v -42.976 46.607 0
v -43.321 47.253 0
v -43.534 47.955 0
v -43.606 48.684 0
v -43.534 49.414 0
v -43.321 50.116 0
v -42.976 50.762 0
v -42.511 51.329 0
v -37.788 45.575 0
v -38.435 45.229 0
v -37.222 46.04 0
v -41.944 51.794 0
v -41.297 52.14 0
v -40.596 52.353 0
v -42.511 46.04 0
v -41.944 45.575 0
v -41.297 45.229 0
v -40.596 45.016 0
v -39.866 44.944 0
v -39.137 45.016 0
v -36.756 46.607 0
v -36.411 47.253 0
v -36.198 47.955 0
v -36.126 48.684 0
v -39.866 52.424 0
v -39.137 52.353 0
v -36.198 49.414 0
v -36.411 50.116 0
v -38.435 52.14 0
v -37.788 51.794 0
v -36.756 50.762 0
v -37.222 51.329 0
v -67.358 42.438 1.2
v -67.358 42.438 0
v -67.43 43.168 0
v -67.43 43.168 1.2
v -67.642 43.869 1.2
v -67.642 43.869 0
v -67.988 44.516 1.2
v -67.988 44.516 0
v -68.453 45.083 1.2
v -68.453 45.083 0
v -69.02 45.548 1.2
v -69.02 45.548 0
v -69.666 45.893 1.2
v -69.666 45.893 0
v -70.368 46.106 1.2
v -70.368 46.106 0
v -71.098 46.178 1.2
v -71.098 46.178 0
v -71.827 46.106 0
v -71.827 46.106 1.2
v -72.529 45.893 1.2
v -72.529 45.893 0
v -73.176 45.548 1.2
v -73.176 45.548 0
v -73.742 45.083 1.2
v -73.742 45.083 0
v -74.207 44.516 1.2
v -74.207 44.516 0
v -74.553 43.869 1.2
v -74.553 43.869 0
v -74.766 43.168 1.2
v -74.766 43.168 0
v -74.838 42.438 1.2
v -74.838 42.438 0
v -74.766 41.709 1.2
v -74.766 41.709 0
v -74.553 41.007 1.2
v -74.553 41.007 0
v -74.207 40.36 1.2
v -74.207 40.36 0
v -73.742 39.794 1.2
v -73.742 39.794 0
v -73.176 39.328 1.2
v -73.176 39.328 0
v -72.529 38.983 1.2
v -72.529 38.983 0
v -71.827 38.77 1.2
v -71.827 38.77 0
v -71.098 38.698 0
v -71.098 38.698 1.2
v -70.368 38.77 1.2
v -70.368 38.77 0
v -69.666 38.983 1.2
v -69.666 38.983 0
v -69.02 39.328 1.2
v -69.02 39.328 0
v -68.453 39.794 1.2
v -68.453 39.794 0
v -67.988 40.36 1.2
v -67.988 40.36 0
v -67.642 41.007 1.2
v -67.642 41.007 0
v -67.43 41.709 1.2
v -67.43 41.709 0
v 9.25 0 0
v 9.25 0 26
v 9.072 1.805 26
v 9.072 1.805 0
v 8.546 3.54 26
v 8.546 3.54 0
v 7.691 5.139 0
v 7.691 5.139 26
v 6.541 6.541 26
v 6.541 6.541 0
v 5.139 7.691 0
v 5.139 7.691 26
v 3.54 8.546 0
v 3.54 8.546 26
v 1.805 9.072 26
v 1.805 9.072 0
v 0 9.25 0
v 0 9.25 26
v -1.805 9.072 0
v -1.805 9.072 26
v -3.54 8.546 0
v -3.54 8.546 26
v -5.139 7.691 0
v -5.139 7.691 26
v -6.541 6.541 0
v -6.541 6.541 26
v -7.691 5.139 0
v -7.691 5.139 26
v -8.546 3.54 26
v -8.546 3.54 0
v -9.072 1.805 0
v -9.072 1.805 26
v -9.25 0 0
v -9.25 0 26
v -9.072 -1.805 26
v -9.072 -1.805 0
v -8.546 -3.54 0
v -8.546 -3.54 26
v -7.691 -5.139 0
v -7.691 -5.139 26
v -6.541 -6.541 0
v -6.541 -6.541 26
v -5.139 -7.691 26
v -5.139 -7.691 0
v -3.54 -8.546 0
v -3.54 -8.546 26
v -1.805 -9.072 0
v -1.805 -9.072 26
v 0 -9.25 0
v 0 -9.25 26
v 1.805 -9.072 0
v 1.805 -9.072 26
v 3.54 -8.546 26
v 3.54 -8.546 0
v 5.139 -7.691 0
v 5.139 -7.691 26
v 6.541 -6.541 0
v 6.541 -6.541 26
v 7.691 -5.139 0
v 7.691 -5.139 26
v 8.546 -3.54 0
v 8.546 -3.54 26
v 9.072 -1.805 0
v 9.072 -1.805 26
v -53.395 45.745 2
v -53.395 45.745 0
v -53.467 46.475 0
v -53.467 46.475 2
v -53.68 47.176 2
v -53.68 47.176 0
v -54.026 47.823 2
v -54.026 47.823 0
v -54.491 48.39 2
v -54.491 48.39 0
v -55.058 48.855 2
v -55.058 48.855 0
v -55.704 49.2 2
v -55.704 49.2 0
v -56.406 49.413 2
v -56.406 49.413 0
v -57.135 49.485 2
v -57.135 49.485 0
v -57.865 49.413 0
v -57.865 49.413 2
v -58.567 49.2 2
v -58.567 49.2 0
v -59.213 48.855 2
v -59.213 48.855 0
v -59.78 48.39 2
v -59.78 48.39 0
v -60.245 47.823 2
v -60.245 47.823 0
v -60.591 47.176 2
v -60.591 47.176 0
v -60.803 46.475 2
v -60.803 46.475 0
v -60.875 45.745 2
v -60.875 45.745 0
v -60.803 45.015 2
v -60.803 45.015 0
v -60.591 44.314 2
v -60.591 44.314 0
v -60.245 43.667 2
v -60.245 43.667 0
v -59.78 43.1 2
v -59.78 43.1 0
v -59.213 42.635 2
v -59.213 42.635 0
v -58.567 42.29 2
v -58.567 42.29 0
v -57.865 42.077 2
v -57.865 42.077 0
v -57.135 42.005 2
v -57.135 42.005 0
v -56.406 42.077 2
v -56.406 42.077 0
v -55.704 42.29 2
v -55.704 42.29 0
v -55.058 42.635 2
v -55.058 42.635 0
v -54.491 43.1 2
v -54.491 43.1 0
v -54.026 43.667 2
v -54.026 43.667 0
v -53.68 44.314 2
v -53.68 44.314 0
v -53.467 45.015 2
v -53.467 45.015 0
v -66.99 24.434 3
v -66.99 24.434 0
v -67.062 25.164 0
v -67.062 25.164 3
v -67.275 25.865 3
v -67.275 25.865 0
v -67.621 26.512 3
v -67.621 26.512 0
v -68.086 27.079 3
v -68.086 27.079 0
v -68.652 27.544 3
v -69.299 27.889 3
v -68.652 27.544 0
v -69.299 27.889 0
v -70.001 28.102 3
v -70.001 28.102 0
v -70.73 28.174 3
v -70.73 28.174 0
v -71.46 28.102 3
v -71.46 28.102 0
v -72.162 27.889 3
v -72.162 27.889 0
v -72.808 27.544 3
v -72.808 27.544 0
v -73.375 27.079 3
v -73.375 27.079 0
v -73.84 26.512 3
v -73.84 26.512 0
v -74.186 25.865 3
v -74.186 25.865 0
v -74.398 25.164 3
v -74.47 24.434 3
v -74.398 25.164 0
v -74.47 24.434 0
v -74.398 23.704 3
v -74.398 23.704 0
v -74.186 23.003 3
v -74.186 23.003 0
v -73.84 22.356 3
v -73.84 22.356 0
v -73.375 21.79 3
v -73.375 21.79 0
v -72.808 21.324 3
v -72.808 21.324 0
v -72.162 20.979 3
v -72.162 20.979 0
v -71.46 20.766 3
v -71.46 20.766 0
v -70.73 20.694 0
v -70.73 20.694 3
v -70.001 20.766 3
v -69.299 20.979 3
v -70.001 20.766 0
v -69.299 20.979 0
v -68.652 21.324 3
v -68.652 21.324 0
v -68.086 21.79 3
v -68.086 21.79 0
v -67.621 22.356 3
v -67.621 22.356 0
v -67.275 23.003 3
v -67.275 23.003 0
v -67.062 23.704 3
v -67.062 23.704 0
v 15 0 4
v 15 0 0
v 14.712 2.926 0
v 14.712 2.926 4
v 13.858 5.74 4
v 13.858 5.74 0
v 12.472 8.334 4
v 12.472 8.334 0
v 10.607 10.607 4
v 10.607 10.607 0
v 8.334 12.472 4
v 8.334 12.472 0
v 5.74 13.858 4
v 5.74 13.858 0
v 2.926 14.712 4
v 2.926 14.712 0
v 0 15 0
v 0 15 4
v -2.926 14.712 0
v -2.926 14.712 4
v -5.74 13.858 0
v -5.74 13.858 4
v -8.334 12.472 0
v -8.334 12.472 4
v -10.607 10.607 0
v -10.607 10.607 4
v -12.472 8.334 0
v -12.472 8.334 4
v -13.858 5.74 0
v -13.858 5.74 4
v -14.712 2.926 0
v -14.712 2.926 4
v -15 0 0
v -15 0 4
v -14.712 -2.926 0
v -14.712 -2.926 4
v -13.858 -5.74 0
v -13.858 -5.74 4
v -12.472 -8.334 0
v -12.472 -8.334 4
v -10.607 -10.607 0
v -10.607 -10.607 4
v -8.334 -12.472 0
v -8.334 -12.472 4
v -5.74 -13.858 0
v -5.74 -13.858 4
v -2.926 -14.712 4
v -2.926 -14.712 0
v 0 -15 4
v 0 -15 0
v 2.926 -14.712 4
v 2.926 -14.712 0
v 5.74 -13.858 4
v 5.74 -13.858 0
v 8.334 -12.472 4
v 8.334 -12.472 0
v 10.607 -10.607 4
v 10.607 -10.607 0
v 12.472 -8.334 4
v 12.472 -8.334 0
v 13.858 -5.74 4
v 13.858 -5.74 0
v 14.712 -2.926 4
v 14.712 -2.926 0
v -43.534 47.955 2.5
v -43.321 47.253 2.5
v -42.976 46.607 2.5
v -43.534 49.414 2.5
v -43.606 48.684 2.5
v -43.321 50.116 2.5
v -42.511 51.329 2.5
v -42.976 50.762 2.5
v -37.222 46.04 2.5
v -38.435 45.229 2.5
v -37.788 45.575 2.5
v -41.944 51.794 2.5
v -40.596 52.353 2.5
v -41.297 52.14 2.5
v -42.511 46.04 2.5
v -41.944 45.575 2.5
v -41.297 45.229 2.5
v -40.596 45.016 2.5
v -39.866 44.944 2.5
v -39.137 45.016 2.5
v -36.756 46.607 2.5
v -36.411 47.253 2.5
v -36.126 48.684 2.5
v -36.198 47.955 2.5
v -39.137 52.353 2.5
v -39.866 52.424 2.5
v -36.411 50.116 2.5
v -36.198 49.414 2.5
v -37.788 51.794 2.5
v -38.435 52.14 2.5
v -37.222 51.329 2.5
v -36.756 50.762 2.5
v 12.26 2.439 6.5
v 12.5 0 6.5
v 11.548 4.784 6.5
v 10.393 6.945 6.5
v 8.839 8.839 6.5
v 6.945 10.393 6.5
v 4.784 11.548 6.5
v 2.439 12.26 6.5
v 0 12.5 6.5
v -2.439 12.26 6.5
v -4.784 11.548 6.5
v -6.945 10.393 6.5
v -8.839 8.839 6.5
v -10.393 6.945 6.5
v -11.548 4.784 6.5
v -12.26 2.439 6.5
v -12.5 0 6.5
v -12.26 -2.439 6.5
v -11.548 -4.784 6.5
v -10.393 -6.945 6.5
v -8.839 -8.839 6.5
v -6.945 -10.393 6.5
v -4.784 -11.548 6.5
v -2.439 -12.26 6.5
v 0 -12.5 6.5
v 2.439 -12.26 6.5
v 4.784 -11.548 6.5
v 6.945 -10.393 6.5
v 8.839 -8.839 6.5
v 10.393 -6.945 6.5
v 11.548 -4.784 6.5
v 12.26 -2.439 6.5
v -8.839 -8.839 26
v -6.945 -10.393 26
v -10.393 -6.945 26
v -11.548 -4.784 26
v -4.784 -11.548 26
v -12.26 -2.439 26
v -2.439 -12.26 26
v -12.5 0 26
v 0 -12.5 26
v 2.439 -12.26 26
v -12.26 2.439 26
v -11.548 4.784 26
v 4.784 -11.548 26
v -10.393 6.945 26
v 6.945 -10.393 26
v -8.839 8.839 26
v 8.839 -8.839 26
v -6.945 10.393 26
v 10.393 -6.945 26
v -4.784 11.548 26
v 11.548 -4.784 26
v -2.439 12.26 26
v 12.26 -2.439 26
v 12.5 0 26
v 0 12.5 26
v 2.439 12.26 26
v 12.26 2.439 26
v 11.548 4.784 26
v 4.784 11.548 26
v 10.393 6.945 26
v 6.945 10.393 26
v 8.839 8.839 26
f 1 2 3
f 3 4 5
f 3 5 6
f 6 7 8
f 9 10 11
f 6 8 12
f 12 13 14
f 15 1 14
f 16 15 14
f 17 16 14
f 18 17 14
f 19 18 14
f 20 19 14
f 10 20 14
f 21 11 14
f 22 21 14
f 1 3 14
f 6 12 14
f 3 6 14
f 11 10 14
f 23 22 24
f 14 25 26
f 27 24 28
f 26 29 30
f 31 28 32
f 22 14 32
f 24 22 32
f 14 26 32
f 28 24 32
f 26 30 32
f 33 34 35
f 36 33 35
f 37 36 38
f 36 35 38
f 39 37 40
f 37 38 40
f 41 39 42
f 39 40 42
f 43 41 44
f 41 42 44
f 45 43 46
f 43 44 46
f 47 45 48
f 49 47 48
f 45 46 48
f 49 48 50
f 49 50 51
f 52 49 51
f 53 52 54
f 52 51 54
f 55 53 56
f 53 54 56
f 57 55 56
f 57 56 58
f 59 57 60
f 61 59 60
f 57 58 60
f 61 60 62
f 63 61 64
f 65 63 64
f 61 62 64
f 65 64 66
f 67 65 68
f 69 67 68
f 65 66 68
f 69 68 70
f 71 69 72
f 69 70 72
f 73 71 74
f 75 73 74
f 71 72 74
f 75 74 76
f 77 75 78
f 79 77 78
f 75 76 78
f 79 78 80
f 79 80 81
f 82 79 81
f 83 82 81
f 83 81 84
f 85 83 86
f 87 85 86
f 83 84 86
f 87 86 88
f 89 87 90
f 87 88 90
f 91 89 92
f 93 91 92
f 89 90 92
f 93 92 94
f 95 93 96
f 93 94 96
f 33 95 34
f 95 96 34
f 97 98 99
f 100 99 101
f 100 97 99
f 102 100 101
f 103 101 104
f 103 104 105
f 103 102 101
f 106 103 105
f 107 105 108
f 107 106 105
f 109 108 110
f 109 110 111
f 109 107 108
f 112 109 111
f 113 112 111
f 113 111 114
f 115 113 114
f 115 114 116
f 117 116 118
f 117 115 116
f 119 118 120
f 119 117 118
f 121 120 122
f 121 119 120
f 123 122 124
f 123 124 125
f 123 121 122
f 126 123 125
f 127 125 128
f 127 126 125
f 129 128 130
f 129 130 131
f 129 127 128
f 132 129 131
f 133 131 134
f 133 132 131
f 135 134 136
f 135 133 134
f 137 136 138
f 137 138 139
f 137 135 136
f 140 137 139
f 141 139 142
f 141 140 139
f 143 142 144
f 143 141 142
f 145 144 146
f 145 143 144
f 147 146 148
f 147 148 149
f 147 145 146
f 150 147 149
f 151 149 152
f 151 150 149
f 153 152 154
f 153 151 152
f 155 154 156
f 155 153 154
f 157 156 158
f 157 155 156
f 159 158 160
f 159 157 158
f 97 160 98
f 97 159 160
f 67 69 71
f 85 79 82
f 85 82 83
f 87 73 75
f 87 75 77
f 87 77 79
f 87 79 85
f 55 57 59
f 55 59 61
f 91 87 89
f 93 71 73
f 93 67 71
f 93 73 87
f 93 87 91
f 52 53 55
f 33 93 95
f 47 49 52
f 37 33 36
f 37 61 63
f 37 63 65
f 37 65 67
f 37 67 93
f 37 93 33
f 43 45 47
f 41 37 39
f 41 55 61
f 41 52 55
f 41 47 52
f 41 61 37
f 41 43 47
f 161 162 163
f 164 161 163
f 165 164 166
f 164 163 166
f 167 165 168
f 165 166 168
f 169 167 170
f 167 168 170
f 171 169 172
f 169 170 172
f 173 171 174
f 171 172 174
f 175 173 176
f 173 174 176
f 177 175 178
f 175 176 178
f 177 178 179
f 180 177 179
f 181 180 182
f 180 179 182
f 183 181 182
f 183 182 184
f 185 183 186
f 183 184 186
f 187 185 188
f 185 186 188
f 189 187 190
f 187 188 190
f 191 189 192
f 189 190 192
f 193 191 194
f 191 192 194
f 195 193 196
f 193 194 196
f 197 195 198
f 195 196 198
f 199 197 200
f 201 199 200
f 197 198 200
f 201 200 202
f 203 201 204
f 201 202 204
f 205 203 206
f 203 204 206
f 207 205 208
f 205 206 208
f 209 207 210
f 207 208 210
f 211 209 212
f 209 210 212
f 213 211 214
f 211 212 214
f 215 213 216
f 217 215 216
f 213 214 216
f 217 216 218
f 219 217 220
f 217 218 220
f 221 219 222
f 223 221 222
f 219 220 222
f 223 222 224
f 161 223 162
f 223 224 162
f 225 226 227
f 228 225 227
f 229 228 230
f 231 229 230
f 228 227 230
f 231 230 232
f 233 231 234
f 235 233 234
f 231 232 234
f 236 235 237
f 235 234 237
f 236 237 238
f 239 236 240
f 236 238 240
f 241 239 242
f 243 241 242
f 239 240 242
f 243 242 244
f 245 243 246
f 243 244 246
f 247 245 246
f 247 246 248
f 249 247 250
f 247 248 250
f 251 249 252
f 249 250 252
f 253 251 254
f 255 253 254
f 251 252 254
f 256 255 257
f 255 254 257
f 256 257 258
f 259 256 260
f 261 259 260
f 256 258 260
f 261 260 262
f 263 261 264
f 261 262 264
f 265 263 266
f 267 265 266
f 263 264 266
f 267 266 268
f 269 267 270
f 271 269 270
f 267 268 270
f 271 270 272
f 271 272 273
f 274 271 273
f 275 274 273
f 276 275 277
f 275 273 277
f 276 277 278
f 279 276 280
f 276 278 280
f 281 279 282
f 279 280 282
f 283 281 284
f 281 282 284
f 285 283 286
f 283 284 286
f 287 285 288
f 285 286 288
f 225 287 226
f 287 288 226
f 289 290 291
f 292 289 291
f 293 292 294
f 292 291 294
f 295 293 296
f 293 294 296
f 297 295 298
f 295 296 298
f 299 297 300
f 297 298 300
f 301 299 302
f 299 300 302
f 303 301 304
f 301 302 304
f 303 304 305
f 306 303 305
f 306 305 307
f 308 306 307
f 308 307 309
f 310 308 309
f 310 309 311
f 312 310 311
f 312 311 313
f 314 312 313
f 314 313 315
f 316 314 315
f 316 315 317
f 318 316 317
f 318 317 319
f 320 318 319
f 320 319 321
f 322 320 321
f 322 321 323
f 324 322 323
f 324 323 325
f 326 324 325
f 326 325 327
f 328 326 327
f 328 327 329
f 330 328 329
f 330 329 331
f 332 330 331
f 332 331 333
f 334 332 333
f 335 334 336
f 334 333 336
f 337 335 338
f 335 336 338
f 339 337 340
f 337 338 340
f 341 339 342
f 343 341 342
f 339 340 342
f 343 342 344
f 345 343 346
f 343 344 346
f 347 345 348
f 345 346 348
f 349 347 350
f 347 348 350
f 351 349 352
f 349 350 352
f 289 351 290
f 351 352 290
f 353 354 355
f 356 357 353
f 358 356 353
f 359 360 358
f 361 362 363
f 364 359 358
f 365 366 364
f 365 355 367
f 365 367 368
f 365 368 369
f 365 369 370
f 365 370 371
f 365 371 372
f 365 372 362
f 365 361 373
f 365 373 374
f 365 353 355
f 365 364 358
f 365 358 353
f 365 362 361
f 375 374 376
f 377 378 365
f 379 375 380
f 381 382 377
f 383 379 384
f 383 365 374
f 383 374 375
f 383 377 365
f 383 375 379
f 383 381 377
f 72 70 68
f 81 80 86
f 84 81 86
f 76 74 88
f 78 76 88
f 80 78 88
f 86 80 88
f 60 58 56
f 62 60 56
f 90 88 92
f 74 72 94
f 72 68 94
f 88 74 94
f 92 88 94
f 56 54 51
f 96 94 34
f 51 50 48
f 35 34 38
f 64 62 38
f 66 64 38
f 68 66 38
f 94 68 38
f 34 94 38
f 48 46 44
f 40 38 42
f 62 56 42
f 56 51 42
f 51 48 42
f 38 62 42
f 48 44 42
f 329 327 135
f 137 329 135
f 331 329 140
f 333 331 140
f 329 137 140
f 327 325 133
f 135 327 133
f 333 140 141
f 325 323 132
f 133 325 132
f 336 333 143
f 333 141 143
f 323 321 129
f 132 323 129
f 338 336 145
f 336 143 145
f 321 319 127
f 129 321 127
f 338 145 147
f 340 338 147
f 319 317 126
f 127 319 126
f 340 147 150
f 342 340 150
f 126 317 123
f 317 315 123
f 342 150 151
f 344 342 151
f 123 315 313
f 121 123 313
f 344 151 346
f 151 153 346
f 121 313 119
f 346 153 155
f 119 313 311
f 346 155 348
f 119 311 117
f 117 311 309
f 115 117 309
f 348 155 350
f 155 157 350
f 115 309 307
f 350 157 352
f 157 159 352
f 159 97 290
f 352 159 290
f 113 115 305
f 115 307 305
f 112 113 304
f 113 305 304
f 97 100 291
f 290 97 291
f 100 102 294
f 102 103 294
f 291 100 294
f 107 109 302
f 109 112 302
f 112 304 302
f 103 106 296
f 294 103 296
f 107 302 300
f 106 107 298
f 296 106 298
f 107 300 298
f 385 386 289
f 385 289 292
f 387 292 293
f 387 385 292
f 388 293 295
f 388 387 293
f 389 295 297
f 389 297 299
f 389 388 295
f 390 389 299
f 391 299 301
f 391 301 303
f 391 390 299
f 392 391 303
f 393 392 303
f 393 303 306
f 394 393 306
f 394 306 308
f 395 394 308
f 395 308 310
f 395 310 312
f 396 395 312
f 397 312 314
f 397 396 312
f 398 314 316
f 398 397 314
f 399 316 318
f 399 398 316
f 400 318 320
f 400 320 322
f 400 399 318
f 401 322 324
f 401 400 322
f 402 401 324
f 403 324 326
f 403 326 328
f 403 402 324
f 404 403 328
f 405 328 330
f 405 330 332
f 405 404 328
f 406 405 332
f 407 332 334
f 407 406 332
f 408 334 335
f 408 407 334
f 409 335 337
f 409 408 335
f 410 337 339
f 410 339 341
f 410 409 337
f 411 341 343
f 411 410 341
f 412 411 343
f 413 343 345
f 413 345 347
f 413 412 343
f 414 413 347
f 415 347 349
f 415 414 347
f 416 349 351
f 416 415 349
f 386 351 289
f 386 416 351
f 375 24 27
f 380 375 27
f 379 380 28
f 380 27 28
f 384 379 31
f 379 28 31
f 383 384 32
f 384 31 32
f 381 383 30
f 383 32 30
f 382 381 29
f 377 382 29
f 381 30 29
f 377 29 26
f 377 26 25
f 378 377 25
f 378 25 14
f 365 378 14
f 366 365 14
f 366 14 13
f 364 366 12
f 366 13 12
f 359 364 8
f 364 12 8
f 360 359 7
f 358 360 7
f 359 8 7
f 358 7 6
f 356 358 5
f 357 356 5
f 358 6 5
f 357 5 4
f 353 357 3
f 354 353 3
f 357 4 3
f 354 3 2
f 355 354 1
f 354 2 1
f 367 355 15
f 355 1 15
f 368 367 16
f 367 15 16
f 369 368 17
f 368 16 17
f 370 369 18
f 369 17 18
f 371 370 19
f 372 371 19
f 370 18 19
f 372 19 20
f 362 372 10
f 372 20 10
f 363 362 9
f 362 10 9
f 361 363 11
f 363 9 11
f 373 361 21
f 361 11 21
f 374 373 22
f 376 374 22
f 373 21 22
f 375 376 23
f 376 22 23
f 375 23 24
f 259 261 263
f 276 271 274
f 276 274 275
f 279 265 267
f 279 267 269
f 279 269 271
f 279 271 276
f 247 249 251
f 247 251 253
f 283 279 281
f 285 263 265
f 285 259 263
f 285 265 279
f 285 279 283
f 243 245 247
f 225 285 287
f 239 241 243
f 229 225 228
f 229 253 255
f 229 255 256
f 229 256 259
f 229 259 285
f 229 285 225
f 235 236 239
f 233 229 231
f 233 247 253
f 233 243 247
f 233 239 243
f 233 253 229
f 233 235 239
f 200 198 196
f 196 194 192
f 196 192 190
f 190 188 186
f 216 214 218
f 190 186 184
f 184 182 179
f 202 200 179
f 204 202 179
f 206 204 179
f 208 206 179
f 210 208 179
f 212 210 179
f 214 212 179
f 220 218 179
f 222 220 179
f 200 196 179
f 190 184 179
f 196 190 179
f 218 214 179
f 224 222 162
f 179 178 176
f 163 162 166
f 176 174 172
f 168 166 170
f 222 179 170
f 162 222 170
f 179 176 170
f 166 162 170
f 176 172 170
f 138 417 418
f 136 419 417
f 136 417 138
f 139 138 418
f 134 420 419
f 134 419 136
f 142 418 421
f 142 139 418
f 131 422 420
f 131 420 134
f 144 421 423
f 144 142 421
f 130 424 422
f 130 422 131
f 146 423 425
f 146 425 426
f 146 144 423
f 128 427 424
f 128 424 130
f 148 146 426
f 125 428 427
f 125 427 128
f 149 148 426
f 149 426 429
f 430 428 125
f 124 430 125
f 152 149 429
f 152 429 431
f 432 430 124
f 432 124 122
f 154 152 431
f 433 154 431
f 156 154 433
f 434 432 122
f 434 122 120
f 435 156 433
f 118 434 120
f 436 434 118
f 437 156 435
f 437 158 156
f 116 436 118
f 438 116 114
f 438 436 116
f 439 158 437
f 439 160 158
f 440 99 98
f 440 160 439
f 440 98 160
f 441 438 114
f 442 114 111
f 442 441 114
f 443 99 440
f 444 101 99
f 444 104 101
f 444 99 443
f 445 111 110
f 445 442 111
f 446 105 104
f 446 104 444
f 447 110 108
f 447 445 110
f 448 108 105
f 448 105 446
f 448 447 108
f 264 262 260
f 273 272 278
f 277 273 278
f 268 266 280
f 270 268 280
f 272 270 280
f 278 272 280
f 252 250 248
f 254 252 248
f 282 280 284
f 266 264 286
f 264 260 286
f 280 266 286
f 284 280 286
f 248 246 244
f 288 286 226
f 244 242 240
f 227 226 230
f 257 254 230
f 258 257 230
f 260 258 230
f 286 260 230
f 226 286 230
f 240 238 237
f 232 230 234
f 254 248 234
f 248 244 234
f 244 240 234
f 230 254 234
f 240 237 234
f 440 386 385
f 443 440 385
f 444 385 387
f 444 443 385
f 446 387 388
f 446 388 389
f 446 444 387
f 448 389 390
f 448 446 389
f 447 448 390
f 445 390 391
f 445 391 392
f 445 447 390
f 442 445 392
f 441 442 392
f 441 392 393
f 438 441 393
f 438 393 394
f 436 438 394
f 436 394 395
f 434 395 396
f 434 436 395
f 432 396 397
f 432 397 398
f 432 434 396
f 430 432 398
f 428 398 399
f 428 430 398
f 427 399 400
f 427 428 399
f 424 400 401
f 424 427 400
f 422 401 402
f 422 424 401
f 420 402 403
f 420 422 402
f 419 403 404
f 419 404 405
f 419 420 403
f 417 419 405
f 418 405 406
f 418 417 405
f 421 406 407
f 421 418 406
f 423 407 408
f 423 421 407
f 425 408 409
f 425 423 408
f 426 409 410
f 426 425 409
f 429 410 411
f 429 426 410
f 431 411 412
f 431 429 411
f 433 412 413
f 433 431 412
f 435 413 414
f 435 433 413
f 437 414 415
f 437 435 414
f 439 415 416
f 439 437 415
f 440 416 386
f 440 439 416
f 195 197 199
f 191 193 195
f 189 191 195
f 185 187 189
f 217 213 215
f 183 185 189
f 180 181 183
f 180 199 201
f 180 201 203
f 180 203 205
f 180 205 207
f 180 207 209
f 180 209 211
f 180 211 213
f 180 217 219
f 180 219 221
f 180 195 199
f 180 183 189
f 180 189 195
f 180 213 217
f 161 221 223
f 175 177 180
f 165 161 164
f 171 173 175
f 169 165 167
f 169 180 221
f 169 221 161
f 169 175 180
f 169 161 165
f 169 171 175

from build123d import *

# Parameters (mm, degrees)
F0_R      = 3.74
F1_DEPTH  = 1.2
F2_R      = 3.74
F3_DEPTH  = 2
F4_R      = 3.74
F5_DEPTH  = 2.5
F6_R      = 3.74
F7_DEPTH  = 3
F8_R      = 15
F8_R_2    = 9.25
F9_DEPTH  = 26
F10_R     = 15
F10_R_2   = 12.5
F11_DEPTH = 22
F12_SIZE  = 2.49999


# Not quite as in the source:
# - a fillet or chamfer is up to 0.001 mm smaller than in the source, because OpenCascade refuses the exact size


with BuildPart() as f1:
    # F0 (on Top) → F1 (new body)
    with BuildSketch(Plane.XY):
        with Locations((-71.0977017879, 42.4381643534)):
            Circle(F0_R)
    extrude(amount=F1_DEPTH)


with BuildPart() as f3:
    # F2 (on Top) → F3 (new body)
    with BuildSketch(Plane.XY):
        with Locations((-57.1353621781, 45.7450337708)):
            Circle(F2_R)
    extrude(amount=F3_DEPTH)


with BuildPart() as f5:
    # F4 (on Top) → F5 (new body)
    with BuildSketch(Plane.XY):
        with Locations((-39.8661494255, 48.6844740808)):
            Circle(F4_R)
    extrude(amount=F5_DEPTH)


with BuildPart() as f7:
    # F6 (on Top) → F7 (new body)
    with BuildSketch(Plane.XY):
        with Locations((-70.7302689552, 24.4340933859)):
            Circle(F6_R)
    extrude(amount=F7_DEPTH)


with BuildPart() as f9:
    # F8 (on Top) → F9 (new body)
    with BuildSketch(Plane.XY):
        Circle(F8_R)
        Circle(F8_R_2, mode=Mode.SUBTRACT)
    extrude(amount=F9_DEPTH)

    # F10 (on face) → F11 (cut)
    with BuildSketch(Plane.XY.offset(26)):
        Circle(F10_R)
        Circle(F10_R_2, mode=Mode.SUBTRACT)
    extrude(amount=-F11_DEPTH, mode=Mode.SUBTRACT)

    # F12 (size 2.5 in the source; OpenCascade refuses exactly that, so slightly less here)
    f12_edges = [f9.edges().sort_by_distance(p)[0] for p in [
        (-12.5, 0, 4),
    ]]
    chamfer(f12_edges, length=F12_SIZE)


solid = Compound([f1.part, f3.part, f5.part, f7.part, f9.part])
